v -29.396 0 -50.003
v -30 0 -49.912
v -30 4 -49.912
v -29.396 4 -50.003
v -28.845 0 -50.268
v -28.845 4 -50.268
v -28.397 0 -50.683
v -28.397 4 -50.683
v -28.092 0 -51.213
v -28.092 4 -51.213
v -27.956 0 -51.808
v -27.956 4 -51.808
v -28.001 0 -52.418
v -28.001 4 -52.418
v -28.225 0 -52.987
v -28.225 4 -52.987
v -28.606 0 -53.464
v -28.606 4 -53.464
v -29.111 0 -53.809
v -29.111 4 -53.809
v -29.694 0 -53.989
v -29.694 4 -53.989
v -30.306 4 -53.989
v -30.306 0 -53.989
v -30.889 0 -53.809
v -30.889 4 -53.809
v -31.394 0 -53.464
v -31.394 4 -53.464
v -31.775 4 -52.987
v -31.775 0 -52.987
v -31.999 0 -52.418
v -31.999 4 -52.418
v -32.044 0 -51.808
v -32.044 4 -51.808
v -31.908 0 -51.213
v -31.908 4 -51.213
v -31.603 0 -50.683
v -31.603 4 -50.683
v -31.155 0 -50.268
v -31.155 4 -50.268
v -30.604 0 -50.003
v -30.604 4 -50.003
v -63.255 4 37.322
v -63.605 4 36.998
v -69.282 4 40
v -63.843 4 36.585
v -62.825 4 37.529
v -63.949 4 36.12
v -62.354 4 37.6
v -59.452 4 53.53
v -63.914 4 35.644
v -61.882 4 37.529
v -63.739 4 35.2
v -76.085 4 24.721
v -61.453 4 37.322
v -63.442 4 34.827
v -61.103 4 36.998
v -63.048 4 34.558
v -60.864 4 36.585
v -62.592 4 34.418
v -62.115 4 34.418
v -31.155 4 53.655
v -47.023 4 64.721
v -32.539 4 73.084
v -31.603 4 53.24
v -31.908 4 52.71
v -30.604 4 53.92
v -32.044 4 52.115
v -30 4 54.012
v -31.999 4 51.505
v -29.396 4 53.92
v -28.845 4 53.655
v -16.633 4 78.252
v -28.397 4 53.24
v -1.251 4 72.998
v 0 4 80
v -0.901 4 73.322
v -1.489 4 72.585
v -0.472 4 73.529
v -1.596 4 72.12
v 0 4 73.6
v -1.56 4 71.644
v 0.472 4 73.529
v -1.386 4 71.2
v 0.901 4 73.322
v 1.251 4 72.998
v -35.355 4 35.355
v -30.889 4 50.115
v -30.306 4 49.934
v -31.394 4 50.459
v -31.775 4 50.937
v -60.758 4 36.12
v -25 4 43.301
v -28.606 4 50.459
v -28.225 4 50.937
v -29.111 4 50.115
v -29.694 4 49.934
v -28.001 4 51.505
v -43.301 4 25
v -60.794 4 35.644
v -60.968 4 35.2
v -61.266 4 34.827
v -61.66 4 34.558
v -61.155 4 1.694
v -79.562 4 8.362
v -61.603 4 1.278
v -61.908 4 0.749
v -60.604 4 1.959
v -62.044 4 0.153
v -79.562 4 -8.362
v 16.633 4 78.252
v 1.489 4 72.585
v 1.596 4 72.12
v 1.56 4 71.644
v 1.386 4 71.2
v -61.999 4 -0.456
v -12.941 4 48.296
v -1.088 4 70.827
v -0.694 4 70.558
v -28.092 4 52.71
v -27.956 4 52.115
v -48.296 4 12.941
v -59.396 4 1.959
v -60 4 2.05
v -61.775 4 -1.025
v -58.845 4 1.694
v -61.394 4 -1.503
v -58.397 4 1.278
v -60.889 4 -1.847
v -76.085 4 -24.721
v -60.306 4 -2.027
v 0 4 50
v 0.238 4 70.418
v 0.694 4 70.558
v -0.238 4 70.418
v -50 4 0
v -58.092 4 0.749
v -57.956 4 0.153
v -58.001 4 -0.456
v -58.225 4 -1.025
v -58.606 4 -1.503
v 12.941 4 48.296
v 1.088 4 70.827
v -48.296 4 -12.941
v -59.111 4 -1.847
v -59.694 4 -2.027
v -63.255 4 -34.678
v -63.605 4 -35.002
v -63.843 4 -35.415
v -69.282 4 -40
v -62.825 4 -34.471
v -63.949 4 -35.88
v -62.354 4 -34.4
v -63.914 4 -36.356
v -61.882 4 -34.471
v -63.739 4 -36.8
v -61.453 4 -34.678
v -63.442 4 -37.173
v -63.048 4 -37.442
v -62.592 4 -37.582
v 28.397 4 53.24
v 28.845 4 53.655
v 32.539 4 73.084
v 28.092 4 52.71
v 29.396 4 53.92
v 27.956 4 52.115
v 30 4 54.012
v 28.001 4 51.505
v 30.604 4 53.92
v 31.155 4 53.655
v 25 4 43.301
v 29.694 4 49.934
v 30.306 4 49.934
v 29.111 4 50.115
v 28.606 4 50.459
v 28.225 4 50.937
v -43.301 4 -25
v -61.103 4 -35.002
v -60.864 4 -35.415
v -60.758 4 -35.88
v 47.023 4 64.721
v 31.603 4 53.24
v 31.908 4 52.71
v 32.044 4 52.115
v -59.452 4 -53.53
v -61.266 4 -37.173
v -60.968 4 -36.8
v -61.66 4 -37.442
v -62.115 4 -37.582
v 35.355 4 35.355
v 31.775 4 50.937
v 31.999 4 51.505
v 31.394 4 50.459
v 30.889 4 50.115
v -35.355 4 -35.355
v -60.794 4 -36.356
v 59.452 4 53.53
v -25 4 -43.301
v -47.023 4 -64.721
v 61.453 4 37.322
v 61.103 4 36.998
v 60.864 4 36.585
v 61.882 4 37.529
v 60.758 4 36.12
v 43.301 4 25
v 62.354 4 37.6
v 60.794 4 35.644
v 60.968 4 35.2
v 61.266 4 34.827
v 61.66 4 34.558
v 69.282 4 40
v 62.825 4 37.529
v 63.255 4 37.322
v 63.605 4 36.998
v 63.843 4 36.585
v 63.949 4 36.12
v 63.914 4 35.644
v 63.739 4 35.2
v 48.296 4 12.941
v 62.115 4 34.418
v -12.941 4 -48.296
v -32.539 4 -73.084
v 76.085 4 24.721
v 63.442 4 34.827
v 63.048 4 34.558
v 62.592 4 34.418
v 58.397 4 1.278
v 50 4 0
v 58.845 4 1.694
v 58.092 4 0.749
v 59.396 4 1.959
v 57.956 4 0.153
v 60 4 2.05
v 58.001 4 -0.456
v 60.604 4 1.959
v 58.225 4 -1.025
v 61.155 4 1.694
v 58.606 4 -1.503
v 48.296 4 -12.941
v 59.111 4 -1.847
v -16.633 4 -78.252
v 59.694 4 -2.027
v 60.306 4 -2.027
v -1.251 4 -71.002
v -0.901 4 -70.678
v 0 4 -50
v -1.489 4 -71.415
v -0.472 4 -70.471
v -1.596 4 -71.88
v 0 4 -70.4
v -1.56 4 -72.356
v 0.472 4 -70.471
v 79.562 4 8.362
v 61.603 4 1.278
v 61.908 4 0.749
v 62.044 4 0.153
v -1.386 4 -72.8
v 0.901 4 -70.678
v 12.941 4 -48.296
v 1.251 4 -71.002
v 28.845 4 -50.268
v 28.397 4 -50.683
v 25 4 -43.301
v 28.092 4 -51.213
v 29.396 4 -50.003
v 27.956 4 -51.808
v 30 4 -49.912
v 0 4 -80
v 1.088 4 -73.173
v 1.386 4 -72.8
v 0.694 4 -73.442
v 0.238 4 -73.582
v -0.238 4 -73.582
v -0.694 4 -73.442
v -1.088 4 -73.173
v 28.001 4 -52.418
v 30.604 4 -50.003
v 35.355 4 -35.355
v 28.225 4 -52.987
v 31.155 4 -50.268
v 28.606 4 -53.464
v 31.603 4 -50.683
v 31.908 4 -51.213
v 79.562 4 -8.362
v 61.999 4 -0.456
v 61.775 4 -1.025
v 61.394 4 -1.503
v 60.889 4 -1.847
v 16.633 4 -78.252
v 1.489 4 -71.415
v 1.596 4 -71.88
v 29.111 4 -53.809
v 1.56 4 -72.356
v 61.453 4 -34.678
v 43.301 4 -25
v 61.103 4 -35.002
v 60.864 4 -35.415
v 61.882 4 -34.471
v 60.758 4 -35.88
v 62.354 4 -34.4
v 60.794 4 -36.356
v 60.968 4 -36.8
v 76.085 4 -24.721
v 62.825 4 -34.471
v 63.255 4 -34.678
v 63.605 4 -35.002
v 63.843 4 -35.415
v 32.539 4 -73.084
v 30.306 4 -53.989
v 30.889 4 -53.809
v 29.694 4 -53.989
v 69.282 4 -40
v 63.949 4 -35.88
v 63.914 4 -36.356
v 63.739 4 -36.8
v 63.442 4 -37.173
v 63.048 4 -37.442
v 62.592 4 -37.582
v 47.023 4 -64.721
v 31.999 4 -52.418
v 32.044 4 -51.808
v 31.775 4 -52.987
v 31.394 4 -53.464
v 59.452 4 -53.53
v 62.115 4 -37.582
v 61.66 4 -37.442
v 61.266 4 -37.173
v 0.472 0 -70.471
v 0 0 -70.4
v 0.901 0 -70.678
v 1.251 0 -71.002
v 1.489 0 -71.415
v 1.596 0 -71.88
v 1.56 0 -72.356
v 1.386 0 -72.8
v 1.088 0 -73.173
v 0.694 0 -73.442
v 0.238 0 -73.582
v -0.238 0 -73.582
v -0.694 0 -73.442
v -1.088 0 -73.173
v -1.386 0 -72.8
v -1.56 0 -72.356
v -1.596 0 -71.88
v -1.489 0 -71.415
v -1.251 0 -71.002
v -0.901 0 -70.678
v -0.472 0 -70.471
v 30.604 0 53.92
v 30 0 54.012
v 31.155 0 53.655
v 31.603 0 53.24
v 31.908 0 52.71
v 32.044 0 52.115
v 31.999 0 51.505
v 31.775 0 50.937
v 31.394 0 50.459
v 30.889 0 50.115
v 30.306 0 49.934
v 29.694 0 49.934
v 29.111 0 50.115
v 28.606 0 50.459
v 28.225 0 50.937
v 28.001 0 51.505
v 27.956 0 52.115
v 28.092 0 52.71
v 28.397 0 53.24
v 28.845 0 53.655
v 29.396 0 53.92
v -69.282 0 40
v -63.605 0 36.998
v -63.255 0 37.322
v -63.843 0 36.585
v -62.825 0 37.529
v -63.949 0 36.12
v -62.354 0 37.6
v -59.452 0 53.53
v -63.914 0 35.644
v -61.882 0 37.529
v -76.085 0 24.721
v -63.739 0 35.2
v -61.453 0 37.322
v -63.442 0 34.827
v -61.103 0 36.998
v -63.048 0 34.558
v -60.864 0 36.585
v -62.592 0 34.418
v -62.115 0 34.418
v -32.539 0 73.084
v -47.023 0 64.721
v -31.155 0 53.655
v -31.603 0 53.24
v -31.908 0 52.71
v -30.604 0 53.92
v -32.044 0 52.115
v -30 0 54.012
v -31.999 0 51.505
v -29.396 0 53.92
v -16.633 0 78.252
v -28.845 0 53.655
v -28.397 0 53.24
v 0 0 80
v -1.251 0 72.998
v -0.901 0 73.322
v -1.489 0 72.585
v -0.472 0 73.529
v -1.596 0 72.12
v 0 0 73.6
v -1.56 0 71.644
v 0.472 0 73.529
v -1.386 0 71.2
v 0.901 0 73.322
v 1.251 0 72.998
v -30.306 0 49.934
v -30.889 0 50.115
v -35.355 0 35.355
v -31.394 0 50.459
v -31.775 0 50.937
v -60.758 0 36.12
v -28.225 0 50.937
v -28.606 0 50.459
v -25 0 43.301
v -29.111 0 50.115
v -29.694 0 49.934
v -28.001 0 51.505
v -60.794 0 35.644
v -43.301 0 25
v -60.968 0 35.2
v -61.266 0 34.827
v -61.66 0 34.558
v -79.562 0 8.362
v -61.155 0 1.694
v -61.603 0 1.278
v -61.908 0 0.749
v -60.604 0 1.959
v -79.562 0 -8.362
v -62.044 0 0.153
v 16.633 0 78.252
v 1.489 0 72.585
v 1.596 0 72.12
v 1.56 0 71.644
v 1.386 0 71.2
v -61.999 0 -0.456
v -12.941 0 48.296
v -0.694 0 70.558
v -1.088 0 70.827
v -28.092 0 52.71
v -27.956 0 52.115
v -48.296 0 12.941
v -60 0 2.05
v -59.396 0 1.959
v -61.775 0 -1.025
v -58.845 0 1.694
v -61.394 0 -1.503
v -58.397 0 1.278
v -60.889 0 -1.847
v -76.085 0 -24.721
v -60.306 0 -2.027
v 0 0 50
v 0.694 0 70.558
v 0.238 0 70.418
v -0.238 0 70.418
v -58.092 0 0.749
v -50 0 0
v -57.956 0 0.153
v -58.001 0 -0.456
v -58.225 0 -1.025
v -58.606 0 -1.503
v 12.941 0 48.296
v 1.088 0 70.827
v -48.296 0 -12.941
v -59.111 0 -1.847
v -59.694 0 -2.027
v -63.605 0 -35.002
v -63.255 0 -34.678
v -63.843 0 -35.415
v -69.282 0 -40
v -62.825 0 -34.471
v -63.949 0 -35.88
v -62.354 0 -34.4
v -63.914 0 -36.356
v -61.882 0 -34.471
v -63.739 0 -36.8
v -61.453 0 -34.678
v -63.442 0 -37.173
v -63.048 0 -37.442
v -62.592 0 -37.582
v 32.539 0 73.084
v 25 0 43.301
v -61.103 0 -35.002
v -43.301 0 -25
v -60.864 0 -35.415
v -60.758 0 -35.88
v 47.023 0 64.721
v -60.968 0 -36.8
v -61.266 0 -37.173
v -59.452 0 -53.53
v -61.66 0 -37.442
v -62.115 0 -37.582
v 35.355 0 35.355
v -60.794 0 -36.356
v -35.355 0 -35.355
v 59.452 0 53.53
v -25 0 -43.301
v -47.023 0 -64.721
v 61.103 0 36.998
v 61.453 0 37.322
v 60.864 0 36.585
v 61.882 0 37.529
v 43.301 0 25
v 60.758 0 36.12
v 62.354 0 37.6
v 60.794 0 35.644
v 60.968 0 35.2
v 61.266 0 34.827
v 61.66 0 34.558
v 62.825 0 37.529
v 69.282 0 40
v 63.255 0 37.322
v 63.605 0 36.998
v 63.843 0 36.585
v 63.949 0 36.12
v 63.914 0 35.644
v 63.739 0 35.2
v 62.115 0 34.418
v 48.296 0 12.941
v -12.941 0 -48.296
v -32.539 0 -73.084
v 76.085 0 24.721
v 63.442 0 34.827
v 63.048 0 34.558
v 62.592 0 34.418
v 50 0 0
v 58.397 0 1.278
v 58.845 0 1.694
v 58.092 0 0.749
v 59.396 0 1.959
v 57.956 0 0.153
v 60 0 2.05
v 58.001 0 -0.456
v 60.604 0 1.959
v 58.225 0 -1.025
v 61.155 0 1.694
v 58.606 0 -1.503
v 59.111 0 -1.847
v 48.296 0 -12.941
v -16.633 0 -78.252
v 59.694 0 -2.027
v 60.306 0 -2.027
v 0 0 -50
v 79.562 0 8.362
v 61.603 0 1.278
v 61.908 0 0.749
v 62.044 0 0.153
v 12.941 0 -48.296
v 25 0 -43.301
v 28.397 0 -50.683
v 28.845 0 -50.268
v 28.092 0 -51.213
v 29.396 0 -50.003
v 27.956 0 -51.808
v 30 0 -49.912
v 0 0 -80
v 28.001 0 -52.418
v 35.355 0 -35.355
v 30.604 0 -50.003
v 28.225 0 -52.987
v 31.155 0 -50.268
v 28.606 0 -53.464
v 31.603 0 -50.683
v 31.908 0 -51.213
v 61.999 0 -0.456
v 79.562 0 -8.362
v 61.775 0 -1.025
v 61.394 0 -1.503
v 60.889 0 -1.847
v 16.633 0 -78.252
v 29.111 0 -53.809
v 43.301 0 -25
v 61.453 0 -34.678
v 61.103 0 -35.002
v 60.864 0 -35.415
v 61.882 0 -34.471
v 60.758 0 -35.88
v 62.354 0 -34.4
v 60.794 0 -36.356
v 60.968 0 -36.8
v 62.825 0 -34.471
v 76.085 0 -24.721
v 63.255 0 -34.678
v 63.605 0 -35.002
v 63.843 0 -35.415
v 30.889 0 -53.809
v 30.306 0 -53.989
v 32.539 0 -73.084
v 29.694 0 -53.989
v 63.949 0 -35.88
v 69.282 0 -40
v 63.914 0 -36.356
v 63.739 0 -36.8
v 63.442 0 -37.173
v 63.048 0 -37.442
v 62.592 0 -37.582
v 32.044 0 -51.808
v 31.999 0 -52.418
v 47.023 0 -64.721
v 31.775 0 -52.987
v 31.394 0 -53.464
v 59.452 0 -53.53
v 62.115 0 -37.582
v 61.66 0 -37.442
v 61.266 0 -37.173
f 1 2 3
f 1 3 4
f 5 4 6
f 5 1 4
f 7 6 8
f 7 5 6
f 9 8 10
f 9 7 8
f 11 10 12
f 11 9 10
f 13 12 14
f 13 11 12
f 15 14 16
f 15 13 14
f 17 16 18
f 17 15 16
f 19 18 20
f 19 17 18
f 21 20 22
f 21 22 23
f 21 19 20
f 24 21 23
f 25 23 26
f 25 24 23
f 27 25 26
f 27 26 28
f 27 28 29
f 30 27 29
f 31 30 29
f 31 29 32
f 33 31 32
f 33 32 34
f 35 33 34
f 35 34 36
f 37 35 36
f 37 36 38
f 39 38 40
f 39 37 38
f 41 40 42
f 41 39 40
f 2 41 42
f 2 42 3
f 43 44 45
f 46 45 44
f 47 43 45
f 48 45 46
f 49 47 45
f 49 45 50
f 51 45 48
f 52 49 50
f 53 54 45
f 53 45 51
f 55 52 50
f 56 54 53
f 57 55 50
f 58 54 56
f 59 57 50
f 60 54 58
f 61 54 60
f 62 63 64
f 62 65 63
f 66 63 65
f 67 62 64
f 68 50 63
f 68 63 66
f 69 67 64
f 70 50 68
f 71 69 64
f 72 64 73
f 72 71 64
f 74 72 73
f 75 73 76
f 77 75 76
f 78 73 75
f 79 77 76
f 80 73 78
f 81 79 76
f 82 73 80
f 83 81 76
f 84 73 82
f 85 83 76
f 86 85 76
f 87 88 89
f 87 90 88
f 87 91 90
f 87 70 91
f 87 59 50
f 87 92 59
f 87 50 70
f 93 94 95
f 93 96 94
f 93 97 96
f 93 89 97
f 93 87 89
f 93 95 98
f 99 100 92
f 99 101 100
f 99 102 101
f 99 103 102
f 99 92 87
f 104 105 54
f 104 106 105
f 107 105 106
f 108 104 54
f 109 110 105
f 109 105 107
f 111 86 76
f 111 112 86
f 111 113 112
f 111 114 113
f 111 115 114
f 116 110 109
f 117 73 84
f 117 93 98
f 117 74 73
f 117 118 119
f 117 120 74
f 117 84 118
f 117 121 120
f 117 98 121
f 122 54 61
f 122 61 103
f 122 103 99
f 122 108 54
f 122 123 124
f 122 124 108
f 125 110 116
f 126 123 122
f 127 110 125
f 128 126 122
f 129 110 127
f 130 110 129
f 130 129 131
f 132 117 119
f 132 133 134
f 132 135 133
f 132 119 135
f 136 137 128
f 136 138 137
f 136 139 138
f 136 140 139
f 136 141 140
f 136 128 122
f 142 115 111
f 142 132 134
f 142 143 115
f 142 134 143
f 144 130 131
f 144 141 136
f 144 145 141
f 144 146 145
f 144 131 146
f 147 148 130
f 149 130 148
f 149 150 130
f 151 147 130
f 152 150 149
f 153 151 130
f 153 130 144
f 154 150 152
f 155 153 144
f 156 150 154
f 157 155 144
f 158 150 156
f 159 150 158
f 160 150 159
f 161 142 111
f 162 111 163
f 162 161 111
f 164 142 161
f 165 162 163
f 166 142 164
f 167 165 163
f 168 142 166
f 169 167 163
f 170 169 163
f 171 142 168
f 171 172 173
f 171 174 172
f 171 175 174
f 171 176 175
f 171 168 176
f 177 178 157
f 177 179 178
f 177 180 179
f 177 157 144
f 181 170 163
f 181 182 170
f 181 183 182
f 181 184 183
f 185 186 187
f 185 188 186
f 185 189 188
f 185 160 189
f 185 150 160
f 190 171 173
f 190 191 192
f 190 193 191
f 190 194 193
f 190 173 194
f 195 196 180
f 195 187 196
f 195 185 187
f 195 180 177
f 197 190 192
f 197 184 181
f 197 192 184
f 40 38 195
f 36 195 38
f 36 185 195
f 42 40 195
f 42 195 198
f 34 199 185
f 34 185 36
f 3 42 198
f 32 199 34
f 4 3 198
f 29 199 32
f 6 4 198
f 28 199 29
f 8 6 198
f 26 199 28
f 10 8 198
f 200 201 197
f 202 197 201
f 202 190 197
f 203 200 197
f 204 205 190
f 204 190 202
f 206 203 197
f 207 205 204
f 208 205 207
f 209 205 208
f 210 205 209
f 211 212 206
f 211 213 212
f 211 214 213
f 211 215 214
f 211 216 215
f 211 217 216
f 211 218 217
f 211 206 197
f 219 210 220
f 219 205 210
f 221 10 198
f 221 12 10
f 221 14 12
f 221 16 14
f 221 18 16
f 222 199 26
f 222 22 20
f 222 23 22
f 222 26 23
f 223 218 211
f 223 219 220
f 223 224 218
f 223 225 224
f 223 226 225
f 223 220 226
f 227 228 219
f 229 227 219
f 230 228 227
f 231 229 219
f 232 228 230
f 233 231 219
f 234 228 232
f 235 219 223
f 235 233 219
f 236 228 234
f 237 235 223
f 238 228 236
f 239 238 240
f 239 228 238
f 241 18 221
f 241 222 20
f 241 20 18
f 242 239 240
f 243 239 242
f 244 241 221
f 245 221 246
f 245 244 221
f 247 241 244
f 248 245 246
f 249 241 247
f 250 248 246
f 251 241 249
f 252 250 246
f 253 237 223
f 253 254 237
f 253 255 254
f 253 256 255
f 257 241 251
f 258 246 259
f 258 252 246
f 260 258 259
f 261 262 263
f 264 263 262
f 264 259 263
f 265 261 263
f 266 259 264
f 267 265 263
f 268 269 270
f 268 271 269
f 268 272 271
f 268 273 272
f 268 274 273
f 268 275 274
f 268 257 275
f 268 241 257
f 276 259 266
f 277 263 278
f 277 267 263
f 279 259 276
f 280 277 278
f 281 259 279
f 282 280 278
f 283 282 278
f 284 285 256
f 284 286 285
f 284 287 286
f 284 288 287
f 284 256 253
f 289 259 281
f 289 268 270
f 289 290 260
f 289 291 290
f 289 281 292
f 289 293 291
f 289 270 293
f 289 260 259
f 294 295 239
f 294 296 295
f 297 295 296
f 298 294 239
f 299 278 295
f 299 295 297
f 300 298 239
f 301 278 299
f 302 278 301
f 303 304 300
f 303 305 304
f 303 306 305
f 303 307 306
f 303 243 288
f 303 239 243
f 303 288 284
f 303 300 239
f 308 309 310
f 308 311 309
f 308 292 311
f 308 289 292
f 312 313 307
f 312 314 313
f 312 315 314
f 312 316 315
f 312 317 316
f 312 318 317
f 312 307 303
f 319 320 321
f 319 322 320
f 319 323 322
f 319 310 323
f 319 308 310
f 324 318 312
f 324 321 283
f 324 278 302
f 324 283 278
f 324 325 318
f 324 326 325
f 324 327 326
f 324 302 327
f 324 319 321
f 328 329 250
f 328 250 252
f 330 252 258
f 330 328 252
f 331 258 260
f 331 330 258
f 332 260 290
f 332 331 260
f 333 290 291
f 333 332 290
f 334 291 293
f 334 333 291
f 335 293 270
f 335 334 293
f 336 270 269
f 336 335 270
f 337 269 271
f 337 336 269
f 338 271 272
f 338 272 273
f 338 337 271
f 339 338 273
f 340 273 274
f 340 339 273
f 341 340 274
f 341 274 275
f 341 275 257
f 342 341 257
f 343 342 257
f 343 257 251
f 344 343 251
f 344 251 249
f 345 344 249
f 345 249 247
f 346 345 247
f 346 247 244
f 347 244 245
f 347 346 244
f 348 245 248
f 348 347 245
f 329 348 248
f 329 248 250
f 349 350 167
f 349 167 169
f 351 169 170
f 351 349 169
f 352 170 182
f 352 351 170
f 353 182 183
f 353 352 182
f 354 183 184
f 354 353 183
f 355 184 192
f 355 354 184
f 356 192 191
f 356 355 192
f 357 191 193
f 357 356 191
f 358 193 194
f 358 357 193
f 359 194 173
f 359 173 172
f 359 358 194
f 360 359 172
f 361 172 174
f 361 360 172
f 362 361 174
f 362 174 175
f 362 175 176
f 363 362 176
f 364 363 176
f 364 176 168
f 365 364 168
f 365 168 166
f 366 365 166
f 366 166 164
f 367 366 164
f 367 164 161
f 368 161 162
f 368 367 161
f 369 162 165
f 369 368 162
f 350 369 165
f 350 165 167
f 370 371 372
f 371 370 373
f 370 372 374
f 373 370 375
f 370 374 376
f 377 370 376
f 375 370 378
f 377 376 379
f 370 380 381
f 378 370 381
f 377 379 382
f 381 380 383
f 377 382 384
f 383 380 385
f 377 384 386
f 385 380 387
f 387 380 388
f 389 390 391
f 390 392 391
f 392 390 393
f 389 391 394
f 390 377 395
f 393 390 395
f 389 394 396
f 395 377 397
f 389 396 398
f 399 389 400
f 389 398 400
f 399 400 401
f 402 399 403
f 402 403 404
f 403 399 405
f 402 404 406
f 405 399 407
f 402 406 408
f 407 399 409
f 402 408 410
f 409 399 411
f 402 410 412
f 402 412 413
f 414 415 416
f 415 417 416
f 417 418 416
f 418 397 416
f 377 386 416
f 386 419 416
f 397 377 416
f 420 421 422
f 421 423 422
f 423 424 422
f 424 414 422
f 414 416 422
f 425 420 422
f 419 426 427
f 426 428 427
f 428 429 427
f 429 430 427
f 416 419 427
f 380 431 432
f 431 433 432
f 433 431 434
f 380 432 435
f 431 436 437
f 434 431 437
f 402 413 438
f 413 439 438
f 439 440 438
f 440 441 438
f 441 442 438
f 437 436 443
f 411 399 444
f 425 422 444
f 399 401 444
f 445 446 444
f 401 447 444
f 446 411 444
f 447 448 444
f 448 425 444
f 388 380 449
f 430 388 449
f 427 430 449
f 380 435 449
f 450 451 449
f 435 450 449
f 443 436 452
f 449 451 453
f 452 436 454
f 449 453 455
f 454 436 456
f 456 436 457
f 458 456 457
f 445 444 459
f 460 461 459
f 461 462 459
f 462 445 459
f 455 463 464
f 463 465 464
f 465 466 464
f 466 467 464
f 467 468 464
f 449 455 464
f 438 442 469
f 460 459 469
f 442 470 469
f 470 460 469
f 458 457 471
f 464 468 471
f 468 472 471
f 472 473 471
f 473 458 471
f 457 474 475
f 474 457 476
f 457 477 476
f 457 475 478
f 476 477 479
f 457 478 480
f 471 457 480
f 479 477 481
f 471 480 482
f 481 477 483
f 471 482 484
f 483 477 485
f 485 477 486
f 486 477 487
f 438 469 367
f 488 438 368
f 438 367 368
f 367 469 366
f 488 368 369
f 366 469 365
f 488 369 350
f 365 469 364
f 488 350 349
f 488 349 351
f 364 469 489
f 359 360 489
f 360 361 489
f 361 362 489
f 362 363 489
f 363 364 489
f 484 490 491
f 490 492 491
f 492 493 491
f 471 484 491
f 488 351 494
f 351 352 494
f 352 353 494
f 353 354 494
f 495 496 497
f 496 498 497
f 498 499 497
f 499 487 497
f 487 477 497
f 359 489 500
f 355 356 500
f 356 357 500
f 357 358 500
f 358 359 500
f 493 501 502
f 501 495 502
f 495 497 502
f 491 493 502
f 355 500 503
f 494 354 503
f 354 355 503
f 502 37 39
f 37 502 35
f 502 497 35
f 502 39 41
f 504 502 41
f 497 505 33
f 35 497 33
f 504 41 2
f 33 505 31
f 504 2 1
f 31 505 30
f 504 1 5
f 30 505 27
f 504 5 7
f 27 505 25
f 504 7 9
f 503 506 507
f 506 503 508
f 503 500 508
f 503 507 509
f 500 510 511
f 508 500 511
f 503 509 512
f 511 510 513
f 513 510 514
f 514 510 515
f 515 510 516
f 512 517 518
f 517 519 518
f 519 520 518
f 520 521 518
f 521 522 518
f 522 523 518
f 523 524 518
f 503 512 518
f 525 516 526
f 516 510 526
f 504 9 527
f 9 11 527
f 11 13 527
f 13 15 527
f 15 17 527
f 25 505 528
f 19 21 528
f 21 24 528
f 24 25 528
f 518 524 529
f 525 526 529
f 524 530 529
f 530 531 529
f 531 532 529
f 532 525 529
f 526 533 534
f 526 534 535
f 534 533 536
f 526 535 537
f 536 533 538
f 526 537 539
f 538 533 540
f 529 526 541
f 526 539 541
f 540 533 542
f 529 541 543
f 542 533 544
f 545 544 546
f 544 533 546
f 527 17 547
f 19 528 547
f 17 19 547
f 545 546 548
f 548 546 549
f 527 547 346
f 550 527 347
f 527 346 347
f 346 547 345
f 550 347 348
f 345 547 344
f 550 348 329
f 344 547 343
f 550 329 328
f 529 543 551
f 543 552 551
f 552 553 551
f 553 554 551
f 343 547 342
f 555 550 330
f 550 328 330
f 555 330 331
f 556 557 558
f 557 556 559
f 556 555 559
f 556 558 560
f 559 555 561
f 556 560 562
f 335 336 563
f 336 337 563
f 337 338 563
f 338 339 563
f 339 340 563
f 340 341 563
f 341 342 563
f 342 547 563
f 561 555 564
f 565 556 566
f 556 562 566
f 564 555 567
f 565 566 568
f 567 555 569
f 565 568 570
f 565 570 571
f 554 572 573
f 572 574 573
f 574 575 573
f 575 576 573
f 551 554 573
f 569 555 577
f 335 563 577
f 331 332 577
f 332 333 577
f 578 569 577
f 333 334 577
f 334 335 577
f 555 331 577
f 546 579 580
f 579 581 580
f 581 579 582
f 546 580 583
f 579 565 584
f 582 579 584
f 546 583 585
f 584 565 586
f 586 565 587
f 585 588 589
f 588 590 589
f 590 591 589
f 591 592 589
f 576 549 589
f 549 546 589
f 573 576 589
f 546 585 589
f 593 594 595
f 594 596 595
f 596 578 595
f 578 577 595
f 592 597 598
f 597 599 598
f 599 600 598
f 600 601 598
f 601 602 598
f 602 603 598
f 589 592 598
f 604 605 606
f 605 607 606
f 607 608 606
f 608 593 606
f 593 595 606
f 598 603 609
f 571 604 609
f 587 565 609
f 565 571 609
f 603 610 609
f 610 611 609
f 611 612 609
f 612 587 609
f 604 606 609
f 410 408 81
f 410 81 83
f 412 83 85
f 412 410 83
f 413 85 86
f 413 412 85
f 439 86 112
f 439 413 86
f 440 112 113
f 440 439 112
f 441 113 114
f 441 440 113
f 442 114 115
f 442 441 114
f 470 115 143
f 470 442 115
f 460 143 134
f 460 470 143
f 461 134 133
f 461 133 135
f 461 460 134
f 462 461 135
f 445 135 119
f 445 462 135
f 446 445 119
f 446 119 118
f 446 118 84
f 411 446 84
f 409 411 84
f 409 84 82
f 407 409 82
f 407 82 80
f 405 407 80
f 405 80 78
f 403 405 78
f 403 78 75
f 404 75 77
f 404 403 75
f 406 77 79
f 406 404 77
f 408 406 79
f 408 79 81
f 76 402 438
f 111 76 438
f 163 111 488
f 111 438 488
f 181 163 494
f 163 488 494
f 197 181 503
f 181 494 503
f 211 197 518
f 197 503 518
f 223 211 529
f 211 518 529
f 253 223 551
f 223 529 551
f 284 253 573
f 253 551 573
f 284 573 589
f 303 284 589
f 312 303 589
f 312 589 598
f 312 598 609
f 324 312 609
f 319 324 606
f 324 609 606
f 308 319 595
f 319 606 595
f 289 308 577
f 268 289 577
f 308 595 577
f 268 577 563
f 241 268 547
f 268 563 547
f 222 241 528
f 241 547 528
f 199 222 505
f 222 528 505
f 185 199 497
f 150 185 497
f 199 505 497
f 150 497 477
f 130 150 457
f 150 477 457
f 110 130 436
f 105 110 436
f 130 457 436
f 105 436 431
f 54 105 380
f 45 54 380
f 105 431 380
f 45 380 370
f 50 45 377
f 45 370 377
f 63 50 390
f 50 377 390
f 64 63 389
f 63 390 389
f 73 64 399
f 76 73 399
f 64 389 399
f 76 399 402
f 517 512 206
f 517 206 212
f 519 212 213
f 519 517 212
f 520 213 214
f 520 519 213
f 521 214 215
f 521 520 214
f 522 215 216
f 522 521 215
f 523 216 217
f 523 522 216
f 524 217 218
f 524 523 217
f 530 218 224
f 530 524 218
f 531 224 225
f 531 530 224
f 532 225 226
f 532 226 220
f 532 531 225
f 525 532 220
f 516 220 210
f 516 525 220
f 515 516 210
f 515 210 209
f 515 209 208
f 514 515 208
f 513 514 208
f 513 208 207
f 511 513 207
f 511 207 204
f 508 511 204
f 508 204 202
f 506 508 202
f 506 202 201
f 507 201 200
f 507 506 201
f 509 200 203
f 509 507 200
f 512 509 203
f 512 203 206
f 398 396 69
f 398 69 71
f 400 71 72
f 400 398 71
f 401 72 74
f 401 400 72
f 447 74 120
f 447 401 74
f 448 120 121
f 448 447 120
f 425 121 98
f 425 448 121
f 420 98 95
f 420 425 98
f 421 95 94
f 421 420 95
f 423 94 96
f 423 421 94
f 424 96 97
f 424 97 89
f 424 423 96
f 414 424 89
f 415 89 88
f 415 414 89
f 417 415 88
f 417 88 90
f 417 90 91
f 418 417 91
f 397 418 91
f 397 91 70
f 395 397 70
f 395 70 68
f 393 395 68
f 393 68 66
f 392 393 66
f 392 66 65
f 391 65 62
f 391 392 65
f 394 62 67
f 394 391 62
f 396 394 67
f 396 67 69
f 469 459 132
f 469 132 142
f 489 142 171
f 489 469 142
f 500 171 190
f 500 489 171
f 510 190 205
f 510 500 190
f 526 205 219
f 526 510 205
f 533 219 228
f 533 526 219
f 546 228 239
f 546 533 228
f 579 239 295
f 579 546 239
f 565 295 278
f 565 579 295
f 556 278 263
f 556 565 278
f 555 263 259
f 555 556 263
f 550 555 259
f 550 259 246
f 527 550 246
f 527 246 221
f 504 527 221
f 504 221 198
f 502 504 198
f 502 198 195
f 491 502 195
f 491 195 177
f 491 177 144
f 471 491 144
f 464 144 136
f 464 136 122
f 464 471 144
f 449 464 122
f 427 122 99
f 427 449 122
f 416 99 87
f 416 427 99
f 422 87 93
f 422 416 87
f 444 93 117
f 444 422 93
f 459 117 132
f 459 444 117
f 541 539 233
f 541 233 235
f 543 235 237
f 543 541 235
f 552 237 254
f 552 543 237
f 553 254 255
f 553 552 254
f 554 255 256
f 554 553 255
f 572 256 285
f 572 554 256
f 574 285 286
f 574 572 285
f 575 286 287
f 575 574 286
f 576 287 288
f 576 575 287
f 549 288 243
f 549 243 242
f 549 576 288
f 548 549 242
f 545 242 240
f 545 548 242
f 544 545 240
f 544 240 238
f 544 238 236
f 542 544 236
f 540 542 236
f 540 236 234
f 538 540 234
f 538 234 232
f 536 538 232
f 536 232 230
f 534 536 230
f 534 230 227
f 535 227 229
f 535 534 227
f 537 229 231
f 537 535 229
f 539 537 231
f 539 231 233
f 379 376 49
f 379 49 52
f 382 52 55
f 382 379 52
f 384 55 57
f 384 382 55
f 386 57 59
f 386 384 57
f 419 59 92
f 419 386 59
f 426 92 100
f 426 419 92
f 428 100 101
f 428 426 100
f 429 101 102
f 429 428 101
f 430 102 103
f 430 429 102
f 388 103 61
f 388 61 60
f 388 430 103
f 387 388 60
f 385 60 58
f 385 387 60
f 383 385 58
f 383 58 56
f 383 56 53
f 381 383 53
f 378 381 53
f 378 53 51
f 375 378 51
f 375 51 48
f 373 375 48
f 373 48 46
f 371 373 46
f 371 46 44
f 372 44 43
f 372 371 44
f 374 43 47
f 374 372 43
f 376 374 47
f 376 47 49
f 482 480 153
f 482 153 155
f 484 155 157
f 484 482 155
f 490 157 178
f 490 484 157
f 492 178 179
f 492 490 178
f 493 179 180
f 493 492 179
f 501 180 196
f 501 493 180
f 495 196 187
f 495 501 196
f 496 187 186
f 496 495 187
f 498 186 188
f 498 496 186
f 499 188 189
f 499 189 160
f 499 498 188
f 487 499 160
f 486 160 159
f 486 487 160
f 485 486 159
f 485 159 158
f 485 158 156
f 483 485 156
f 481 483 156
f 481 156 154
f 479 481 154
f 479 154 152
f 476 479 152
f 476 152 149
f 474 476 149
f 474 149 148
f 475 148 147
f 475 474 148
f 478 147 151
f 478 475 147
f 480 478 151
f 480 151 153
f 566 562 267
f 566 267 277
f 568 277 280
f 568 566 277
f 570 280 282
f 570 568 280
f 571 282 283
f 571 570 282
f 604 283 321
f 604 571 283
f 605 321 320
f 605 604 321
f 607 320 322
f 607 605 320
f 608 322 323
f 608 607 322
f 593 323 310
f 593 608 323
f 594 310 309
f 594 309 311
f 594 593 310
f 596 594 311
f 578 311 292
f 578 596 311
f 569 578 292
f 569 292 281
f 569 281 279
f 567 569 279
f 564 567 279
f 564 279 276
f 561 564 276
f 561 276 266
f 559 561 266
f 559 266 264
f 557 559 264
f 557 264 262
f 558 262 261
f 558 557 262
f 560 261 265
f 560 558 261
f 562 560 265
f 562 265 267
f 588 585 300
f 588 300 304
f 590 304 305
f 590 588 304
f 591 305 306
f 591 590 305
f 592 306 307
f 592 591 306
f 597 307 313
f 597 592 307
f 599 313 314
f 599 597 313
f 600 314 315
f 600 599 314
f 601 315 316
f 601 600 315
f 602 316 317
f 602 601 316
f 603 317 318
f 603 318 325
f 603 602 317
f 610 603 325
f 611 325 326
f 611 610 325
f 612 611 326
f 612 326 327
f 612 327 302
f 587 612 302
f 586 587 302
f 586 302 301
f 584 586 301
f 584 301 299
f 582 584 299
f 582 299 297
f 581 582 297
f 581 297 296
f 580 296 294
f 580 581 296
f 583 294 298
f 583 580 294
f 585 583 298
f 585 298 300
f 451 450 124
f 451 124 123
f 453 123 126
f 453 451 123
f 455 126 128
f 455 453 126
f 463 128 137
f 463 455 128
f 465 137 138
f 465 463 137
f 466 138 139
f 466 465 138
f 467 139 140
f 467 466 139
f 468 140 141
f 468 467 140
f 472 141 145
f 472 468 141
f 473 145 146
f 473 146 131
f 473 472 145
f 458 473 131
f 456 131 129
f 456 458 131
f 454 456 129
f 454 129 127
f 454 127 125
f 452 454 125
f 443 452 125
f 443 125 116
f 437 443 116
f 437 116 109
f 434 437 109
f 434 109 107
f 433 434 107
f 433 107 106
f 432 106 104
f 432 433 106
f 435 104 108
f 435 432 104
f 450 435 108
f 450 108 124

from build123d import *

# Parameters (mm, degrees)
SKETCH_1_R      = 80
SKETCH_1_R_2    = 50
SKETCH_1_R_3    = 2.05
EXTRUDE_1_DEPTH = 4
EXTRUDE_START   = -4
SKETCH_2_R      = 2.05
SKETCH_2_R_2    = 1.6
EXTRUDE_2_DEPTH = 4


with BuildPart() as part:
    # 草图1 → 凸台-拉伸1 (new body)
    with BuildSketch(Plane(origin=(0, 0, 0), x_dir=(1, 0, 0), z_dir=(0, 1, 0))):
        with Locations(Location((0, 0, 0), (0, 0, 270))):
            Circle(SKETCH_1_R)
        with Locations(Location((0, 0, 0), (0, 0, 270))):
            Circle(SKETCH_1_R_2, mode=Mode.SUBTRACT)
        with Locations(Location((60, 0, 0), (0, 0, 270))):
            Circle(SKETCH_1_R_3, mode=Mode.SUBTRACT)
        with Locations(Location((30, -51.961524227, 0), (0, 0, 270))):
            Circle(SKETCH_1_R_3, mode=Mode.SUBTRACT)
        with Locations(Location((-30, -51.961524227, 0), (0, 0, 270))):
            Circle(SKETCH_1_R_3, mode=Mode.SUBTRACT)
        with Locations(Location((-60, 0, 0), (0, 0, 270))):
            Circle(SKETCH_1_R_3, mode=Mode.SUBTRACT)
        with Locations(Location((-30, 51.961524227, 0), (0, 0, 270))):
            Circle(SKETCH_1_R_3, mode=Mode.SUBTRACT)
        with Locations(Location((30, 51.961524227, 0), (0, 0, 270))):
            Circle(SKETCH_1_R_3, mode=Mode.SUBTRACT)
        with Locations(Location((-62.353829072, 36, 0), (0, 0, 270))):
            Circle(SKETCH_1_R_3, mode=Mode.SUBTRACT)
        with Locations(Location((0, 72, 0), (0, 0, 270))):
            Circle(SKETCH_1_R_3, mode=Mode.SUBTRACT)
        with Locations(Location((62.353829072, 36, 0), (0, 0, 270))):
            Circle(SKETCH_1_R_3, mode=Mode.SUBTRACT)
        with Locations(Location((62.353829072, -36, 0), (0, 0, 270))):
            Circle(SKETCH_1_R_3, mode=Mode.SUBTRACT)
        with Locations(Location((0, -72, 0), (0, 0, 270))):
            Circle(SKETCH_1_R_3, mode=Mode.SUBTRACT)
        with Locations(Location((-62.353829072, -36, 0), (0, 0, 270))):
            Circle(SKETCH_1_R_3, mode=Mode.SUBTRACT)
    extrude(amount=EXTRUDE_1_DEPTH)

    # 草图2 → 凸台-拉伸2 (add)
    # profile 1 of 6: a face of its own
    with BuildSketch(Plane(origin=(0, 4, 0), x_dir=(1, 0, 0), z_dir=(0, 1, 0)).offset(EXTRUDE_START)):
        with Locations((62.353829072, 36)):
            Circle(SKETCH_2_R)
        with Locations(Location((62.353829072, 36, 0), (0, 0, 270))):
            Circle(SKETCH_2_R_2, mode=Mode.SUBTRACT)
    # profile 2 of 6: a face of its own
    with BuildSketch(Plane(origin=(0, 4, 0), x_dir=(1, 0, 0), z_dir=(0, 1, 0)).offset(EXTRUDE_START)):
        with Locations((62.353829072, -36)):
            Circle(SKETCH_2_R)
        with Locations(Location((62.353829072, -36, 0), (0, 0, 270))):
            Circle(SKETCH_2_R_2, mode=Mode.SUBTRACT)
    # profile 3 of 6: a face of its own
    with BuildSketch(Plane(origin=(0, 4, 0), x_dir=(1, 0, 0), z_dir=(0, 1, 0)).offset(EXTRUDE_START)):
        with Locations((0, -72)):
            Circle(SKETCH_2_R)
        with Locations(Location((0, -72, 0), (0, 0, 270))):
            Circle(SKETCH_2_R_2, mode=Mode.SUBTRACT)
    # profile 4 of 6: a face of its own
    with BuildSketch(Plane(origin=(0, 4, 0), x_dir=(1, 0, 0), z_dir=(0, 1, 0)).offset(EXTRUDE_START)):
        with Locations((-62.353829072, -36)):
            Circle(SKETCH_2_R)
        with Locations(Location((-62.353829072, -36, 0), (0, 0, 270))):
            Circle(SKETCH_2_R_2, mode=Mode.SUBTRACT)
    # profile 5 of 6: a face of its own
    with BuildSketch(Plane(origin=(0, 4, 0), x_dir=(1, 0, 0), z_dir=(0, 1, 0)).offset(EXTRUDE_START)):
        with Locations((-62.353829072, 36)):
            Circle(SKETCH_2_R)
        with Locations(Location((-62.353829072, 36, 0), (0, 0, 270))):
            Circle(SKETCH_2_R_2, mode=Mode.SUBTRACT)
    # profile 6 of 6: a face of its own
    with BuildSketch(Plane(origin=(0, 4, 0), x_dir=(1, 0, 0), z_dir=(0, 1, 0)).offset(EXTRUDE_START)):
        with Locations((0, 72)):
            Circle(SKETCH_2_R)
        with Locations(Location((0, 72, 0), (0, 0, 270))):
            Circle(SKETCH_2_R_2, mode=Mode.SUBTRACT)
    extrude(amount=EXTRUDE_2_DEPTH)


solid = part.part
